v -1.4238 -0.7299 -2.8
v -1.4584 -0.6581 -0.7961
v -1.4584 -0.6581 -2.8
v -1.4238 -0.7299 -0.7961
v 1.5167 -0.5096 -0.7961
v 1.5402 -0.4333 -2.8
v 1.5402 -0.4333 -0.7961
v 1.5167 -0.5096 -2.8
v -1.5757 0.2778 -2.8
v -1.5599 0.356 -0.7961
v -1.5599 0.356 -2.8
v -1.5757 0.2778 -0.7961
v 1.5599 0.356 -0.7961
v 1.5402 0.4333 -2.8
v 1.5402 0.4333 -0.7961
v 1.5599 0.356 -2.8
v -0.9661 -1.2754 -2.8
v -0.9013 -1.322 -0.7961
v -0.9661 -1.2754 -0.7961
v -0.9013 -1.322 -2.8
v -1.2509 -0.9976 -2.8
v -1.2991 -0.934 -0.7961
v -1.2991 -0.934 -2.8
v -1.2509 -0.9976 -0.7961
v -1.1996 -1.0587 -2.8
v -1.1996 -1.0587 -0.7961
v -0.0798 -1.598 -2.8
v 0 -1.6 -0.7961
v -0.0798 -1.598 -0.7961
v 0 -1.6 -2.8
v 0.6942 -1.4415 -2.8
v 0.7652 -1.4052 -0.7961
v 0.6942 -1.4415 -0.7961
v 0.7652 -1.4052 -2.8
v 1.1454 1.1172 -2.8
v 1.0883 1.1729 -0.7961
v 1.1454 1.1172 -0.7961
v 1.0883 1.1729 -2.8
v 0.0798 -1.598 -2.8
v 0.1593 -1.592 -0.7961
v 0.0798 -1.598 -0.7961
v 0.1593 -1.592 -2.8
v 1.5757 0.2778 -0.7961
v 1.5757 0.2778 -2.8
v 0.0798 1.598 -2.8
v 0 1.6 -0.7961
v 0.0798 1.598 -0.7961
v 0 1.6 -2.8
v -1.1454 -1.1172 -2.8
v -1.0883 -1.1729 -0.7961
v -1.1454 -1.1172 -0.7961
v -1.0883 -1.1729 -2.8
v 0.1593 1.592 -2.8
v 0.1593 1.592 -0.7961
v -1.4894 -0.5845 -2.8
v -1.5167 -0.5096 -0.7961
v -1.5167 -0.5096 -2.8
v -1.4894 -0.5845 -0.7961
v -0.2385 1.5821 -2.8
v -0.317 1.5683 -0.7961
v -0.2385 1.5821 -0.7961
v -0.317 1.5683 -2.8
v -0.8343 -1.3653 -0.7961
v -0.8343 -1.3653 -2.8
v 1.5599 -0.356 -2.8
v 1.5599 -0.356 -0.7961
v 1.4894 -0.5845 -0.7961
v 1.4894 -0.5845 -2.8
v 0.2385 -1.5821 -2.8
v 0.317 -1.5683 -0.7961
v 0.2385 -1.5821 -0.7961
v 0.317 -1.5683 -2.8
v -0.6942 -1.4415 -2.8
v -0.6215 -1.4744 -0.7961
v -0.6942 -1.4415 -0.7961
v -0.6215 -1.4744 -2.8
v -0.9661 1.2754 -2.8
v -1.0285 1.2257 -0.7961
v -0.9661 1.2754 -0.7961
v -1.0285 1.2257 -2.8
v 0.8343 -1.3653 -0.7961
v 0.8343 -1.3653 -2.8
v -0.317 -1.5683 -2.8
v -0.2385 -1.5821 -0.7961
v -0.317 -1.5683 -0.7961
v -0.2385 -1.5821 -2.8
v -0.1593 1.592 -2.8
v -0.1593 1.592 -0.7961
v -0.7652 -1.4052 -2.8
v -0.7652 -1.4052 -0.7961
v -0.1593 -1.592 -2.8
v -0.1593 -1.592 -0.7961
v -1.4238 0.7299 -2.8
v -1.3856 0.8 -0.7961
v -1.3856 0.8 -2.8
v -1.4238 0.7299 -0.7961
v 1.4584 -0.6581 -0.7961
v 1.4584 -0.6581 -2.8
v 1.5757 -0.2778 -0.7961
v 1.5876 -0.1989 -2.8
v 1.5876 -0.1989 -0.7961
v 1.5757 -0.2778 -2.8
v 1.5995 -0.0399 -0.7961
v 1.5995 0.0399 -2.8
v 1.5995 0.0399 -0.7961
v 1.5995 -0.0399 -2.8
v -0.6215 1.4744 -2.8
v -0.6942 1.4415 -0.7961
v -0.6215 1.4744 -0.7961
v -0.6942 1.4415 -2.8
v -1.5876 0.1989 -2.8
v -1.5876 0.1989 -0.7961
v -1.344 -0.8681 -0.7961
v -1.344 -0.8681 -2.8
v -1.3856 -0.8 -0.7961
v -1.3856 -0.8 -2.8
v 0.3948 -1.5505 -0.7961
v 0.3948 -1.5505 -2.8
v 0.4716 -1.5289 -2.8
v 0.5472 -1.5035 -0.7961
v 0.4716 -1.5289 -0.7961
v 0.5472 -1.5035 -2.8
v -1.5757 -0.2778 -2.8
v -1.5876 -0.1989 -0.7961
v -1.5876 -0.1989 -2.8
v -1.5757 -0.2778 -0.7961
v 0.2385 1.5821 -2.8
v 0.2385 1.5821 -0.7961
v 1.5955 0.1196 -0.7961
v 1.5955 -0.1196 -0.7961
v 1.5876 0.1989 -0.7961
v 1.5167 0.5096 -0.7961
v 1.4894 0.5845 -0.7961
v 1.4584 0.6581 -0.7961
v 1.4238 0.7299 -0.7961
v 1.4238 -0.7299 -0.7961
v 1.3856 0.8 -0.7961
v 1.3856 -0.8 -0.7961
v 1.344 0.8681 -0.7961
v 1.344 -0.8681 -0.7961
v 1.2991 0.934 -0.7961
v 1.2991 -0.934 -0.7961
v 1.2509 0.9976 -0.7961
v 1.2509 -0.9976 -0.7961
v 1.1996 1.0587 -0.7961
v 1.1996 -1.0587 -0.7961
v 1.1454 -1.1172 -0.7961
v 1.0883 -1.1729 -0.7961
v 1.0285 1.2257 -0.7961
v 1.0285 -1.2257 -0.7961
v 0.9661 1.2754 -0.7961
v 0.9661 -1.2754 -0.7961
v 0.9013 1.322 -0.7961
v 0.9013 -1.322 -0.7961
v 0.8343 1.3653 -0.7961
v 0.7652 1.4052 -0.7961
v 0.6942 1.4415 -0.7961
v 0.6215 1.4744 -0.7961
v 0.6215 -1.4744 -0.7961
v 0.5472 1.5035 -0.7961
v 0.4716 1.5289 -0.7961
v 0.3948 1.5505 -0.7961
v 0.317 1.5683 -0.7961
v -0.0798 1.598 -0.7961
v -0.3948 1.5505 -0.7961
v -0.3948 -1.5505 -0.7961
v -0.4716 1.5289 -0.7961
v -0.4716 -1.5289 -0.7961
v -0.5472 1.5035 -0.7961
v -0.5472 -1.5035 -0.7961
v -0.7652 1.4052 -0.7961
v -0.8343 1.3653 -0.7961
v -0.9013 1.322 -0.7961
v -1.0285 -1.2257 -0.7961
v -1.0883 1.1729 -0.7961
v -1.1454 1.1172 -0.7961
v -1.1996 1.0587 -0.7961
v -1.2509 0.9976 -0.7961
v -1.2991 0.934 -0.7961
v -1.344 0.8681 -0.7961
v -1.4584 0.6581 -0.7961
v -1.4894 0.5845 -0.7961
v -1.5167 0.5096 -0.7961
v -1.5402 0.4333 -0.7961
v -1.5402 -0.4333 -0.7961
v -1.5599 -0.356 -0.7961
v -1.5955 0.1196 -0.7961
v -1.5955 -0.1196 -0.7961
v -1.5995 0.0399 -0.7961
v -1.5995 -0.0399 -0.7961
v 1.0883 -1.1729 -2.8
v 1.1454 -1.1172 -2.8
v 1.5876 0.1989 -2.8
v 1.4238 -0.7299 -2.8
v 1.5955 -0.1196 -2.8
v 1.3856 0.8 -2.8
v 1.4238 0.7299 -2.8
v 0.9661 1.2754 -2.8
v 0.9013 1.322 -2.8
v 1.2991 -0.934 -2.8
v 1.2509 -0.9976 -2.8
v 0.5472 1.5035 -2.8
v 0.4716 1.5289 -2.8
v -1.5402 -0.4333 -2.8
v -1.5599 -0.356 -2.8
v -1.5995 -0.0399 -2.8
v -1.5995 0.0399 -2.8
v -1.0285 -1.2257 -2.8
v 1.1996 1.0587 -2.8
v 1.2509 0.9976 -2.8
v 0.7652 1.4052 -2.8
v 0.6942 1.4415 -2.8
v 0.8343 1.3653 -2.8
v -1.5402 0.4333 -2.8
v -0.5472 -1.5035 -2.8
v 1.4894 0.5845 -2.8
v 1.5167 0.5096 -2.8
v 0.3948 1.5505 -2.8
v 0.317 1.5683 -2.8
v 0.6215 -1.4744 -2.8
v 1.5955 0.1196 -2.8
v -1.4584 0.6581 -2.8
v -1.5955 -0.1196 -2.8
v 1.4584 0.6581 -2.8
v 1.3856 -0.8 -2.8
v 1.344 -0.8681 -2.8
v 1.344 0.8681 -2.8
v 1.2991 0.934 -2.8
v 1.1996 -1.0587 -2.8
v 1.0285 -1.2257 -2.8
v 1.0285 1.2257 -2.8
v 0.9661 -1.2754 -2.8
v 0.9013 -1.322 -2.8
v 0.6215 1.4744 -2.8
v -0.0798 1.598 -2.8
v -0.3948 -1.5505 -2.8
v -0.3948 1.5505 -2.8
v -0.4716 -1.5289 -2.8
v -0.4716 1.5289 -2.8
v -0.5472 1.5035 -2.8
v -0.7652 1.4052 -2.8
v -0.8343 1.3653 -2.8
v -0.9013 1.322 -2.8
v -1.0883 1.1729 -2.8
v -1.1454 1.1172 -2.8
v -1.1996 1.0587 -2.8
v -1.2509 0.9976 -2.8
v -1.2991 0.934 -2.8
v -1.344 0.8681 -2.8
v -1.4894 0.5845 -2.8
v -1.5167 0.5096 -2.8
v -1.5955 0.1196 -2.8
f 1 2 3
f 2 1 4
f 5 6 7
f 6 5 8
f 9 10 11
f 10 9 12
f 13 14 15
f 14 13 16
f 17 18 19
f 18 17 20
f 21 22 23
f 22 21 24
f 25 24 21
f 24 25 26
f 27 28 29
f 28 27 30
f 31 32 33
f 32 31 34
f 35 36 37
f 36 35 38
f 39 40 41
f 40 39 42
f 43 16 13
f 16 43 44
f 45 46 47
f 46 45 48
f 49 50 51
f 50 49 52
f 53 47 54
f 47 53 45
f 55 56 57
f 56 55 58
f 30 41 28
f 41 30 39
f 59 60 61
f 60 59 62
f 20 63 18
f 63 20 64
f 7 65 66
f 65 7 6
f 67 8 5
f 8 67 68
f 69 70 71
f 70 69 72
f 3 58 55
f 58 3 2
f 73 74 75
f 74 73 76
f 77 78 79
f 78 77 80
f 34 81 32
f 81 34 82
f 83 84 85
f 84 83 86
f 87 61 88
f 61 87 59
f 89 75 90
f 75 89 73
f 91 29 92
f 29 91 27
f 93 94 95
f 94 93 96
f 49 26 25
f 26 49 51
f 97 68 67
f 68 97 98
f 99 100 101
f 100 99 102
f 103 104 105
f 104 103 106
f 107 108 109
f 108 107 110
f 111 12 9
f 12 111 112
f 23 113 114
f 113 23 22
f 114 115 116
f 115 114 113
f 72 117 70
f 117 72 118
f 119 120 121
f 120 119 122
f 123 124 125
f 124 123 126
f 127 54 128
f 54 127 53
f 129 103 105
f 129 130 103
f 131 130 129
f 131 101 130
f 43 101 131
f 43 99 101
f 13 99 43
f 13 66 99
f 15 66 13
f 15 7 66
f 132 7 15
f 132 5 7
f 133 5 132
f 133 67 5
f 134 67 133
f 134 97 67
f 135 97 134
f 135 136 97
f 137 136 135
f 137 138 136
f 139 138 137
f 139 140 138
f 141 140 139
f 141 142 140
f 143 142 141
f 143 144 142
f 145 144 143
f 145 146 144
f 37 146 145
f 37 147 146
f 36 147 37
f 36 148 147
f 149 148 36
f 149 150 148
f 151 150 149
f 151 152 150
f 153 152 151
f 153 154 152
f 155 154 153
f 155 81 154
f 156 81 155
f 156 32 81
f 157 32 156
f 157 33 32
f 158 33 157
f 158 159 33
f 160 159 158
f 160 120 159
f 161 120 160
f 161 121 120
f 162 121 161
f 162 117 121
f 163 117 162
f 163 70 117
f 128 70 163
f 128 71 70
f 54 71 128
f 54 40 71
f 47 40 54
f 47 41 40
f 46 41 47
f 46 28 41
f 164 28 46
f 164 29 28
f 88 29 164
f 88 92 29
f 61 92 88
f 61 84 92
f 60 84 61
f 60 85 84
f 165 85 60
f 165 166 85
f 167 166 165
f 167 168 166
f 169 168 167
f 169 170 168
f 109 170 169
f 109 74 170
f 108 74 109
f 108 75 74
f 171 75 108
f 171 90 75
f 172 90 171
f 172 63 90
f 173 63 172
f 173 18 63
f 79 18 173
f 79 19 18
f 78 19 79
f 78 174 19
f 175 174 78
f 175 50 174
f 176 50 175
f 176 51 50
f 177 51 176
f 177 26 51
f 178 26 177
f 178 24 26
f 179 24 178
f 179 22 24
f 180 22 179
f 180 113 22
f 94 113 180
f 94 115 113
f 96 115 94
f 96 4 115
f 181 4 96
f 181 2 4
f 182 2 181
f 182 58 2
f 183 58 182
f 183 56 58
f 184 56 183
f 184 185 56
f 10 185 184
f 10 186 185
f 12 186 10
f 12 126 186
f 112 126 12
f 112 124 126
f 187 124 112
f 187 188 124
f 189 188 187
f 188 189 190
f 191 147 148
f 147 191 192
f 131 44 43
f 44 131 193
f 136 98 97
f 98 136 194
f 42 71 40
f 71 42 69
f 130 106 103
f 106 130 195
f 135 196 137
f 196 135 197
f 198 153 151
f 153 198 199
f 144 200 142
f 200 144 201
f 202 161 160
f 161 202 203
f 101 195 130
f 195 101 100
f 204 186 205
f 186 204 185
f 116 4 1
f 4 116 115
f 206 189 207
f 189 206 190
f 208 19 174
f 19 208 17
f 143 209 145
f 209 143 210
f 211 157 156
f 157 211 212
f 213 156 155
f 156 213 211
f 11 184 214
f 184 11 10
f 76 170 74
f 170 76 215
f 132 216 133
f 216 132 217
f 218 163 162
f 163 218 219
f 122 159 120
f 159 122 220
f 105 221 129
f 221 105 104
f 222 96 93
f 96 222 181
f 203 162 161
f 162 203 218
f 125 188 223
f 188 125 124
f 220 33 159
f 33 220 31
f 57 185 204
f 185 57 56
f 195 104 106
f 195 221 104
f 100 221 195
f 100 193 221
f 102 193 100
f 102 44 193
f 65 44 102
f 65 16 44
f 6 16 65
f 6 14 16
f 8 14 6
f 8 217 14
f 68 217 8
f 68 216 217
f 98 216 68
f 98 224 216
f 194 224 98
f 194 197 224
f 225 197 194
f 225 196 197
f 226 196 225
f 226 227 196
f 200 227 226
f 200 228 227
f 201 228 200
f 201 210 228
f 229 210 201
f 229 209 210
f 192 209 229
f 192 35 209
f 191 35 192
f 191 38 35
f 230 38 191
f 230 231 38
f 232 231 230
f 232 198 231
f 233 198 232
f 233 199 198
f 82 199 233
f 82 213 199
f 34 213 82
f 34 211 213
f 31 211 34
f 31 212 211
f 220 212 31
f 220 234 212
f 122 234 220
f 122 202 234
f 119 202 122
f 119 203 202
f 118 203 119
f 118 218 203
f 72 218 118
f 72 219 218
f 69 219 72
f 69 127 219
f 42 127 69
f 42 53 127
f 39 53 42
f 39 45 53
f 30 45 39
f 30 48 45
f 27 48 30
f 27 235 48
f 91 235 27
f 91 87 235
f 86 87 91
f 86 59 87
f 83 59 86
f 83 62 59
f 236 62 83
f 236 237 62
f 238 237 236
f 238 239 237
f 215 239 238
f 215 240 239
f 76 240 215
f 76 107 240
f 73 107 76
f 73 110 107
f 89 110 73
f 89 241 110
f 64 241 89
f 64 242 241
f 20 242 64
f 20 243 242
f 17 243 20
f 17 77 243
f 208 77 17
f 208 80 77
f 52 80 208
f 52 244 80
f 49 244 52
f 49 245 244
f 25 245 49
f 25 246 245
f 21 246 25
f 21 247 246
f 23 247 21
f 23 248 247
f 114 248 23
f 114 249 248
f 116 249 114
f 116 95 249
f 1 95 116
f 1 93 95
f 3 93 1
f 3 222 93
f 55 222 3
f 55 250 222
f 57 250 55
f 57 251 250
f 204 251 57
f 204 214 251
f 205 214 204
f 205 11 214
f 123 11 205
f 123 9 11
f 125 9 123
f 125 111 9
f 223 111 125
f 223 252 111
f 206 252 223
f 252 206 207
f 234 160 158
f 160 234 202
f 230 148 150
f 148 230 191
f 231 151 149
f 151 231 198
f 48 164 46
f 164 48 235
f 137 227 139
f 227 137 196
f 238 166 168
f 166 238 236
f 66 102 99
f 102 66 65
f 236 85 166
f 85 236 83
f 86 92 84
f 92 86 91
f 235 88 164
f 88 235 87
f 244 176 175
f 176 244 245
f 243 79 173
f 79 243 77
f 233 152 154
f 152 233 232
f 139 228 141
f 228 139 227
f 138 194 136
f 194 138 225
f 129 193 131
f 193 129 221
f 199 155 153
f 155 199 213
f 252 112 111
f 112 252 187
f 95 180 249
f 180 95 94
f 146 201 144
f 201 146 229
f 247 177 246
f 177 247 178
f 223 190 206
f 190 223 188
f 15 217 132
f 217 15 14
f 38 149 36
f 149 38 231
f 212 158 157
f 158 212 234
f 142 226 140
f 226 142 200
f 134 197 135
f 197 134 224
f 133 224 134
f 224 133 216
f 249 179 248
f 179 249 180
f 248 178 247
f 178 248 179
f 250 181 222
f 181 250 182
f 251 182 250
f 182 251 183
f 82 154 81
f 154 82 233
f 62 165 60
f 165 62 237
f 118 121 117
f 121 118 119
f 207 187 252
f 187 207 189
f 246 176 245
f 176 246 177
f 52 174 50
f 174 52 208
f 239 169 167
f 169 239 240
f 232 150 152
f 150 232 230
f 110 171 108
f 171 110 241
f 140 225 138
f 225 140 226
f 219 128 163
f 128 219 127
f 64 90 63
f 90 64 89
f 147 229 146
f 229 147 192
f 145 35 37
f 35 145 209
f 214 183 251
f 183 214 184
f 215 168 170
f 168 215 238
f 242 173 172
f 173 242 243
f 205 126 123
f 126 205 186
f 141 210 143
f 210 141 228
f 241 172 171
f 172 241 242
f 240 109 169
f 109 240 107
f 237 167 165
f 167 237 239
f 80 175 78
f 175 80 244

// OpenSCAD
use <../lib.scad>
use <s/3351as01.scad>
$fa=1; $fs=0.2;
function ldraw_lib__3351ap05(realsolid=false) = [
// 0 Roadsign Triangular Type 1 with Skidding Car Pattern
// 0 Name: 3351ap05.dat
// 0 Author: J.C. Tchang [tchang]
// 0 !LDRAW_ORG Part UPDATE 2010-02
// 0 !LICENSE Licensed under CC BY 2.0 and CC BY 4.0 : see CAreadme.txt
// 
// 0 BFC CERTIFY CCW
  [0,"BFC","CERTIFY"],
  [0,"BFC","CCW"],
// 
// 0 !HISTORY 2010-07-05 [PTadmin] Official Update 2010-02
// 
// 
// 1 16 0 0 0 1 0 0 0 1 0 0 0 1 s\3351as01.dat
  [1,16,0,0,0,1,0,0,0,1,0,0,0,1, ldraw_lib__s__3351as01(realsolid)],
// 0 //
// 4 4 -22 -70 -2 -22 -68 -2 22 -68 -2 22 -70 -2
  [4,4,-22,-70,-2,-22,-68,-2,22,-68,-2,22,-70,-2],
// 4 4 22 -70 -2 16.8 -73 -2 -16.8 -73 -2 -22 -70 -2
  [4,4,22,-70,-2,16.8,-73,-2,-16.8,-73,-2,-22,-70,-2],
// 4 4 22 -70 -2 22 -68 -2 23 -68.27 -2 23.73 -69 -2
  [4,4,22,-70,-2,22,-68,-2,23,-68.27,-2,23.73,-69,-2],
// 4 4 22 -70 -2 23.73 -69 -2 24 -70 -2 23.73 -71 -2
  [4,4,22,-70,-2,23.73,-69,-2,24,-70,-2,23.73,-71,-2],
// 4 4 22 -70 -2 23.73 -71 -2 1.73 -109.1 -2 0 -108.1 -2
  [4,4,22,-70,-2,23.73,-71,-2,1.73,-109.1,-2,0,-108.1,-2],
// 4 4 0 -108.1 -2 0 -102.1 -2 16.8 -73 -2 22 -70 -2
  [4,4,0,-108.1,-2,0,-102.1,-2,16.8,-73,-2,22,-70,-2],
// 4 4 -23 -68.27 -2 -22 -68 -2 -22 -70 -2 -23.73 -69 -2
  [4,4,-23,-68.27,-2,-22,-68,-2,-22,-70,-2,-23.73,-69,-2],
// 4 4 -24 -70 -2 -23.73 -69 -2 -22 -70 -2 -23.73 -71 -2
  [4,4,-24,-70,-2,-23.73,-69,-2,-22,-70,-2,-23.73,-71,-2],
// 4 4 0 -108.1 -2 -1.73 -109.1 -2 -23.73 -71 -2 -22 -70 -2
  [4,4,0,-108.1,-2,-1.73,-109.1,-2,-23.73,-71,-2,-22,-70,-2],
// 4 4 -22 -70 -2 -16.8 -73 -2 0 -102.1 -2 0 -108.1 -2
  [4,4,-22,-70,-2,-16.8,-73,-2,0,-102.1,-2,0,-108.1,-2],
// 4 4 -1 -109.83 -2 -1.73 -109.1 -2 0 -108.1 -2 0 -110.1 -2
  [4,4,-1,-109.83,-2,-1.73,-109.1,-2,0,-108.1,-2,0,-110.1,-2],
// 4 4 1 -109.83 -2 0 -110.1 -2 0 -108.1 -2 1.73 -109.1 -2
  [4,4,1,-109.83,-2,0,-110.1,-2,0,-108.1,-2,1.73,-109.1,-2],
// 0 //
// 4 0 -2.1 -82.3 -2 -1.5 -81.8 -2 -0.6 -81.6 -2 0.1 -81.9 -2
  [4,0,-2.1,-82.3,-2,-1.5,-81.8,-2,-0.6,-81.6,-2,0.1,-81.9,-2],
// 4 0 0.1 -81.9 -2 0.4 -82.2 -2 -2.2 -82.8 -2 -2.1 -82.3 -2
  [4,0,0.1,-81.9,-2,0.4,-82.2,-2,-2.2,-82.8,-2,-2.1,-82.3,-2],
// 4 0 1 -82.4 -2 -2.7 -83.2 -2 -2.2 -82.8 -2 0.4 -82.2 -2
  [4,0,1,-82.4,-2,-2.7,-83.2,-2,-2.2,-82.8,-2,0.4,-82.2,-2],
// 4 0 3.2 -79.2 -2 4.1 -79 -2 4.7 -79.8 -2 2.8 -80.2 -2
  [4,0,3.2,-79.2,-2,4.1,-79,-2,4.7,-79.8,-2,2.8,-80.2,-2],
// 4 0 5 -80.9 -2 3.1 -81.3 -2 2.8 -80.2 -2 4.7 -79.8 -2
  [4,0,5,-80.9,-2,3.1,-81.3,-2,2.8,-80.2,-2,4.7,-79.8,-2],
// 4 0 5 -80.9 -2 5.4 -81.4 -2 3 -81.9 -2 3.1 -81.3 -2
  [4,0,5,-80.9,-2,5.4,-81.4,-2,3,-81.9,-2,3.1,-81.3,-2],
// 4 0 5.4 -81.4 -2 6 -81.6 -2 6.8 -85.3 -2 6.5 -86 -2
  [4,0,5.4,-81.4,-2,6,-81.6,-2,6.8,-85.3,-2,6.5,-86,-2],
// 4 0 6.5 -86 -2 6.1 -86.3 -2 3 -81.9 -2 5.4 -81.4 -2
  [4,0,6.5,-86,-2,6.1,-86.3,-2,3,-81.9,-2,5.4,-81.4,-2],
// 4 0 6.2 -86.9 -2 5.1 -87 -2 4.9 -86.7 -2 6.1 -86.3 -2
  [4,0,6.2,-86.9,-2,5.1,-87,-2,4.9,-86.7,-2,6.1,-86.3,-2],
// 4 0 5.9 -90.1 -2 4.9 -89.4 -2 5.1 -87 -2 6.2 -86.9 -2
  [4,0,5.9,-90.1,-2,4.9,-89.4,-2,5.1,-87,-2,6.2,-86.9,-2],
// 4 0 5.9 -90.1 -2 5.6 -90.6 -2 4.7 -89.7 -2 4.9 -89.4 -2
  [4,0,5.9,-90.1,-2,5.6,-90.6,-2,4.7,-89.7,-2,4.9,-89.4,-2],
// 3 0 5.6 -90.6 -2 5.2 -90.9 -2 4.7 -89.7 -2
  [3,0,5.6,-90.6,-2,5.2,-90.9,-2,4.7,-89.7,-2],
// 4 0 1.4 -91.8 -2 1.2 -90.7 -2 4.7 -89.7 -2 5.2 -90.9 -2
  [4,0,1.4,-91.8,-2,1.2,-90.7,-2,4.7,-89.7,-2,5.2,-90.9,-2],
// 4 0 1.4 -91.8 -2 -2.5 -92.4 -2 -2.4 -91.3 -2 1.2 -90.7 -2
  [4,0,1.4,-91.8,-2,-2.5,-92.4,-2,-2.4,-91.3,-2,1.2,-90.7,-2],
// 4 0 -3.3 -92.3 -2 -2.9 -91.3 -2 -2.4 -91.3 -2 -2.5 -92.4 -2
  [4,0,-3.3,-92.3,-2,-2.9,-91.3,-2,-2.4,-91.3,-2,-2.5,-92.4,-2],
// 4 0 -3.3 -92.3 -2 -4 -91.8 -2 -3.1 -91.1 -2 -2.9 -91.3 -2
  [4,0,-3.3,-92.3,-2,-4,-91.8,-2,-3.1,-91.1,-2,-2.9,-91.3,-2],
// 4 0 -5.5 -88.9 -2 -4.2 -89.1 -2 -3.1 -91.1 -2 -4 -91.8 -2
  [4,0,-5.5,-88.9,-2,-4.2,-89.1,-2,-3.1,-91.1,-2,-4,-91.8,-2],
// 4 0 -5.8 -88.5 -2 -4 -88.5 -2 -4.2 -89.1 -2 -5.5 -88.9 -2
  [4,0,-5.8,-88.5,-2,-4,-88.5,-2,-4.2,-89.1,-2,-5.5,-88.9,-2],
// 4 0 -6.5 -88.4 -2 -6.9 -87.8 -2 -7.3 -84.5 -2 -6.9 -84 -2
  [4,0,-6.5,-88.4,-2,-6.9,-87.8,-2,-7.3,-84.5,-2,-6.9,-84,-2],
// 4 0 -6.9 -84 -2 -6.7 -83.9 -2 -5.8 -88.5 -2 -6.5 -88.4 -2
  [4,0,-6.9,-84,-2,-6.7,-83.9,-2,-5.8,-88.5,-2,-6.5,-88.4,-2],
// 4 0 -6.7 -83.9 -2 -6.6 -83.5 -2 -4.9 -83.1 -2 -4.1 -83.4 -2
  [4,0,-6.7,-83.9,-2,-6.6,-83.5,-2,-4.9,-83.1,-2,-4.1,-83.4,-2],
// 4 0 -4.1 -83.4 -2 -4 -88.5 -2 -5.8 -88.5 -2 -6.7 -83.9 -2
  [4,0,-4.1,-83.4,-2,-4,-88.5,-2,-5.8,-88.5,-2,-6.7,-83.9,-2],
// 4 0 -4.1 -83.4 -2 -2.7 -83.2 -2 0.6 -87.7 -2 -4 -88.5 -2
  [4,0,-4.1,-83.4,-2,-2.7,-83.2,-2,0.6,-87.7,-2,-4,-88.5,-2],
// 4 0 -2.7 -83.2 -2 1 -82.4 -2 4.9 -86.7 -2 0.6 -87.7 -2
  [4,0,-2.7,-83.2,-2,1,-82.4,-2,4.9,-86.7,-2,0.6,-87.7,-2],
// 4 0 3 -81.9 -2 6.1 -86.3 -2 4.9 -86.7 -2 1 -82.4 -2
  [4,0,3,-81.9,-2,6.1,-86.3,-2,4.9,-86.7,-2,1,-82.4,-2],
// 4 0 -6.6 -83.5 -2 -6.9 -81.9 -2 -5.1 -81.5 -2 -4.9 -83.1 -2
  [4,0,-6.6,-83.5,-2,-6.9,-81.9,-2,-5.1,-81.5,-2,-4.9,-83.1,-2],
// 4 0 -6.9 -81.9 -2 -6.8 -81 -2 -5.6 -80.8 -2 -5.1 -81.5 -2
  [4,0,-6.9,-81.9,-2,-6.8,-81,-2,-5.6,-80.8,-2,-5.1,-81.5,-2],
// 4 0 -7.2 -78.2 -2 -6 -79.6 -2 -6.3 -80.1 -2 -8.6 -78.2 -2
  [4,0,-7.2,-78.2,-2,-6,-79.6,-2,-6.3,-80.1,-2,-8.6,-78.2,-2],
// 4 0 -8.6 -78.2 -2 -8.6 -77.4 -2 -7.2 -77.8 -2 -7.2 -78.2 -2
  [4,0,-8.6,-78.2,-2,-8.6,-77.4,-2,-7.2,-77.8,-2,-7.2,-78.2,-2],
// 4 0 -5.7 -75.9 -2 -5.3 -76.4 -2 -7.2 -77.8 -2 -8.6 -77.4 -2
  [4,0,-5.7,-75.9,-2,-5.3,-76.4,-2,-7.2,-77.8,-2,-8.6,-77.4,-2],
// 4 0 -2.9 -77.8 -2 -1.3 -79.5 -2 -1.9 -79.9 -2 -4.3 -78.1 -2
  [4,0,-2.9,-77.8,-2,-1.3,-79.5,-2,-1.9,-79.9,-2,-4.3,-78.1,-2],
// 4 0 -4.3 -78.1 -2 -4.2 -77.2 -2 -2.9 -77.3 -2 -2.9 -77.8 -2
  [4,0,-4.3,-78.1,-2,-4.2,-77.2,-2,-2.9,-77.3,-2,-2.9,-77.8,-2],
// 4 0 -2.8 -75.2 -2 -1.4 -75.6 -2 -2.9 -77.3 -2 -4.2 -77.2 -2
  [4,0,-2.8,-75.2,-2,-1.4,-75.6,-2,-2.9,-77.3,-2,-4.2,-77.2,-2],
// 4 0 -2.8 -75.2 -2 -2.8 -74.8 -2 -1.2 -74.8 -2 -1.4 -75.6 -2
  [4,0,-2.8,-75.2,-2,-2.8,-74.8,-2,-1.2,-74.8,-2,-1.4,-75.6,-2],
// 4 0 -3 -74.6 -2 -1.9 -74.1 -2 -1.2 -74.8 -2 -2.8 -74.8 -2
  [4,0,-3,-74.6,-2,-1.9,-74.1,-2,-1.2,-74.8,-2,-2.8,-74.8,-2],
// 4 0 -3 -74.6 -2 -4.9 -74.3 -2 -4.9 -73.8 -2 -3.3 -73.7 -2
  [4,0,-3,-74.6,-2,-4.9,-74.3,-2,-4.9,-73.8,-2,-3.3,-73.7,-2],
// 3 0 -3.3 -73.7 -2 -1.9 -74.1 -2 -3 -74.6 -2
  [3,0,-3.3,-73.7,-2,-1.9,-74.1,-2,-3,-74.6,-2],
// 4 0 0.4 -78.1 -2 -0.1 -77.8 -2 0.2 -77.1 -2 0.9 -77.5 -2
  [4,0,0.4,-78.1,-2,-0.1,-77.8,-2,0.2,-77.1,-2,0.9,-77.5,-2],
// 4 0 1.9 -76.1 -2 2.2 -76.9 -2 0.9 -77.5 -2 0.2 -77.1 -2
  [4,0,1.9,-76.1,-2,2.2,-76.9,-2,0.9,-77.5,-2,0.2,-77.1,-2],
// 4 0 1.9 -76.1 -2 3.9 -75.4 -2 3.8 -76.5 -2 2.2 -76.9 -2
  [4,0,1.9,-76.1,-2,3.9,-75.4,-2,3.8,-76.5,-2,2.2,-76.9,-2],
// 4 0 3.9 -75.4 -2 4.2 -75 -2 5.1 -75.9 -2 3.8 -76.5 -2
  [4,0,3.9,-75.4,-2,4.2,-75,-2,5.1,-75.9,-2,3.8,-76.5,-2],
// 4 0 5.8 -75.1 -2 5.1 -75.9 -2 4.2 -75 -2 5.7 -74.3 -2
  [4,0,5.8,-75.1,-2,5.1,-75.9,-2,4.2,-75,-2,5.7,-74.3,-2],
// 4 0 4.2 -75 -2 4 -74.5 -2 5 -73.7 -2 5.7 -74.3 -2
  [4,0,4.2,-75,-2,4,-74.5,-2,5,-73.7,-2,5.7,-74.3,-2],
// 3 0 4 -74.5 -2 4.1 -73.5 -2 5 -73.7 -2
  [3,0,4,-74.5,-2,4.1,-73.5,-2,5,-73.7,-2],
// 4 0 4 -74.5 -2 3.1 -74.2 -2 3.1 -73.6 -2 4.1 -73.5 -2
  [4,0,4,-74.5,-2,3.1,-74.2,-2,3.1,-73.6,-2,4.1,-73.5,-2],
// 0 //
// 4 16 -2.9 -91.3 -2 -3.1 -91.1 -2 -4.2 -89.1 -2 -4 -88.5 -2
  [4,16,-2.9,-91.3,-2,-3.1,-91.1,-2,-4.2,-89.1,-2,-4,-88.5,-2],
// 4 16 -4 -88.5 -2 0.6 -87.7 -2 -2.4 -91.3 -2 -2.9 -91.3 -2
  [4,16,-4,-88.5,-2,0.6,-87.7,-2,-2.4,-91.3,-2,-2.9,-91.3,-2],
// 4 16 4.9 -86.7 -2 5.1 -87 -2 4.9 -89.4 -2 4.7 -89.7 -2
  [4,16,4.9,-86.7,-2,5.1,-87,-2,4.9,-89.4,-2,4.7,-89.7,-2],
// 4 16 0.6 -87.7 -2 4.9 -86.7 -2 4.7 -89.7 -2 1.2 -90.7 -2
  [4,16,0.6,-87.7,-2,4.9,-86.7,-2,4.7,-89.7,-2,1.2,-90.7,-2],
// 3 16 1.2 -90.7 -2 -2.4 -91.3 -2 0.6 -87.7 -2
  [3,16,1.2,-90.7,-2,-2.4,-91.3,-2,0.6,-87.7,-2],
// 4 16 -2.7 -83.2 -2 -4.1 -83.4 -2 -4.9 -83.1 -2 -2.2 -82.8 -2
  [4,16,-2.7,-83.2,-2,-4.1,-83.4,-2,-4.9,-83.1,-2,-2.2,-82.8,-2],
// 4 16 -5.1 -81.5 -2 -2.1 -82.3 -2 -2.2 -82.8 -2 -4.9 -83.1 -2
  [4,16,-5.1,-81.5,-2,-2.1,-82.3,-2,-2.2,-82.8,-2,-4.9,-83.1,-2],
// 4 16 -5.1 -81.5 -2 -5.6 -80.8 -2 -1.5 -81.8 -2 -2.1 -82.3 -2
  [4,16,-5.1,-81.5,-2,-5.6,-80.8,-2,-1.5,-81.8,-2,-2.1,-82.3,-2],
// 4 16 3 -81.9 -2 1 -82.4 -2 0.4 -82.2 -2 3.1 -81.3 -2
  [4,16,3,-81.9,-2,1,-82.4,-2,0.4,-82.2,-2,3.1,-81.3,-2],
// 4 16 0.1 -81.9 -2 2.8 -80.2 -2 3.1 -81.3 -2 0.4 -82.2 -2
  [4,16,0.1,-81.9,-2,2.8,-80.2,-2,3.1,-81.3,-2,0.4,-82.2,-2],
// 4 16 0.1 -81.9 -2 -0.6 -81.6 -2 3.2 -79.2 -2 2.8 -80.2 -2
  [4,16,0.1,-81.9,-2,-0.6,-81.6,-2,3.2,-79.2,-2,2.8,-80.2,-2],
// 4 16 -1.5 -81.8 -2 -1.9 -79.9 -2 -1.3 -79.5 -2 -0.6 -81.6 -2
  [4,16,-1.5,-81.8,-2,-1.9,-79.9,-2,-1.3,-79.5,-2,-0.6,-81.6,-2],
// 4 16 -5.6 -80.8 -2 -6.3 -80.1 -2 -6 -79.6 -2 -1.5 -81.8 -2
  [4,16,-5.6,-80.8,-2,-6.3,-80.1,-2,-6,-79.6,-2,-1.5,-81.8,-2],
// 4 16 -1.5 -81.8 -2 -6 -79.6 -2 -4.3 -78.1 -2 -1.9 -79.9 -2
  [4,16,-1.5,-81.8,-2,-6,-79.6,-2,-4.3,-78.1,-2,-1.9,-79.9,-2],
// 4 16 -4.3 -78.1 -2 -6 -79.6 -2 -7.2 -78.2 -2 -7.2 -77.8 -2
  [4,16,-4.3,-78.1,-2,-6,-79.6,-2,-7.2,-78.2,-2,-7.2,-77.8,-2],
// 4 16 -7.2 -77.8 -2 -5.3 -76.4 -2 -4.2 -77.2 -2 -4.3 -78.1 -2
  [4,16,-7.2,-77.8,-2,-5.3,-76.4,-2,-4.2,-77.2,-2,-4.3,-78.1,-2],
// 4 16 -4.2 -77.2 -2 -5.3 -76.4 -2 -2.8 -74.8 -2 -2.8 -75.2 -2
  [4,16,-4.2,-77.2,-2,-5.3,-76.4,-2,-2.8,-74.8,-2,-2.8,-75.2,-2],
// 4 16 -5.3 -76.4 -2 -5.7 -75.9 -2 -3 -74.6 -2 -2.8 -74.8 -2
  [4,16,-5.3,-76.4,-2,-5.7,-75.9,-2,-3,-74.6,-2,-2.8,-74.8,-2],
// 4 16 0.4 -78.1 -2 3.2 -79.2 -2 -0.6 -81.6 -2 -1.3 -79.5 -2
  [4,16,0.4,-78.1,-2,3.2,-79.2,-2,-0.6,-81.6,-2,-1.3,-79.5,-2],
// 4 16 -0.1 -77.8 -2 0.4 -78.1 -2 -1.3 -79.5 -2 -2.9 -77.8 -2
  [4,16,-0.1,-77.8,-2,0.4,-78.1,-2,-1.3,-79.5,-2,-2.9,-77.8,-2],
// 4 16 -2.9 -77.8 -2 -2.9 -77.3 -2 0.2 -77.1 -2 -0.1 -77.8 -2
  [4,16,-2.9,-77.8,-2,-2.9,-77.3,-2,0.2,-77.1,-2,-0.1,-77.8,-2],
// 4 16 0.2 -77.1 -2 -2.9 -77.3 -2 -1.4 -75.6 -2 1.9 -76.1 -2
  [4,16,0.2,-77.1,-2,-2.9,-77.3,-2,-1.4,-75.6,-2,1.9,-76.1,-2],
// 4 16 -1.2 -74.8 -2 3.9 -75.4 -2 1.9 -76.1 -2 -1.4 -75.6 -2
  [4,16,-1.2,-74.8,-2,3.9,-75.4,-2,1.9,-76.1,-2,-1.4,-75.6,-2],
// 4 16 4.2 -75 -2 3.9 -75.4 -2 -1.2 -74.8 -2 4 -74.5 -2
  [4,16,4.2,-75,-2,3.9,-75.4,-2,-1.2,-74.8,-2,4,-74.5,-2],
// 3 16 3.1 -74.2 -2 4 -74.5 -2 -1.2 -74.8 -2
  [3,16,3.1,-74.2,-2,4,-74.5,-2,-1.2,-74.8,-2],
// 4 16 3.1 -73.6 -2 3.1 -74.2 -2 -1.2 -74.8 -2 -1.9 -74.1 -2
  [4,16,3.1,-73.6,-2,3.1,-74.2,-2,-1.2,-74.8,-2,-1.9,-74.1,-2],
// 4 16 0.4 -78.1 -2 0.9 -77.5 -2 4.1 -79 -2 3.2 -79.2 -2
  [4,16,0.4,-78.1,-2,0.9,-77.5,-2,4.1,-79,-2,3.2,-79.2,-2],
// 4 16 4.1 -79 -2 0.9 -77.5 -2 2.2 -76.9 -2 3.8 -76.5 -2
  [4,16,4.1,-79,-2,0.9,-77.5,-2,2.2,-76.9,-2,3.8,-76.5,-2],
// 4 16 4.1 -79 -2 3.8 -76.5 -2 5.1 -75.9 -2 4.7 -79.8 -2
  [4,16,4.1,-79,-2,3.8,-76.5,-2,5.1,-75.9,-2,4.7,-79.8,-2],
// 4 16 5.4 -81.4 -2 5 -80.9 -2 4.7 -79.8 -2 6 -81.6 -2
  [4,16,5.4,-81.4,-2,5,-80.9,-2,4.7,-79.8,-2,6,-81.6,-2],
// 4 16 6 -81.6 -2 4.7 -79.8 -2 5.1 -75.9 -2 5.8 -75.1 -2
  [4,16,6,-81.6,-2,4.7,-79.8,-2,5.1,-75.9,-2,5.8,-75.1,-2],
// 4 16 6.8 -85.3 -2 6 -81.6 -2 5.8 -75.1 -2 16.8 -73 -2
  [4,16,6.8,-85.3,-2,6,-81.6,-2,5.8,-75.1,-2,16.8,-73,-2],
// 3 16 5.8 -75.1 -2 5.7 -74.3 -2 16.8 -73 -2
  [3,16,5.8,-75.1,-2,5.7,-74.3,-2,16.8,-73,-2],
// 3 16 5 -73.7 -2 16.8 -73 -2 5.7 -74.3 -2
  [3,16,5,-73.7,-2,16.8,-73,-2,5.7,-74.3,-2],
// 4 16 5 -73.7 -2 4.1 -73.5 -2 4.1 -73 -2 16.8 -73 -2
  [4,16,5,-73.7,-2,4.1,-73.5,-2,4.1,-73,-2,16.8,-73,-2],
// 3 16 3.1 -73.6 -2 4.1 -73 -2 4.1 -73.5 -2
  [3,16,3.1,-73.6,-2,4.1,-73,-2,4.1,-73.5,-2],
// 4 16 4.1 -73 -2 3.1 -73.6 -2 -1.9 -74.1 -2 -3.3 -73.7 -2
  [4,16,4.1,-73,-2,3.1,-73.6,-2,-1.9,-74.1,-2,-3.3,-73.7,-2],
// 4 16 -16.8 -73 -2 4.1 -73 -2 -3.3 -73.7 -2 -4.9 -73.8 -2
  [4,16,-16.8,-73,-2,4.1,-73,-2,-3.3,-73.7,-2,-4.9,-73.8,-2],
// 3 16 -4.9 -74.3 -2 -16.8 -73 -2 -4.9 -73.8 -2
  [3,16,-4.9,-74.3,-2,-16.8,-73,-2,-4.9,-73.8,-2],
// 3 16 -5.7 -75.9 -2 -4.9 -74.3 -2 -3 -74.6 -2
  [3,16,-5.7,-75.9,-2,-4.9,-74.3,-2,-3,-74.6,-2],
// 4 16 -4.9 -74.3 -2 -5.7 -75.9 -2 -8.6 -77.4 -2 -16.8 -73 -2
  [4,16,-4.9,-74.3,-2,-5.7,-75.9,-2,-8.6,-77.4,-2,-16.8,-73,-2],
// 4 16 -6.3 -80.1 -2 -5.6 -80.8 -2 -6.8 -81 -2 -8.6 -78.2 -2
  [4,16,-6.3,-80.1,-2,-5.6,-80.8,-2,-6.8,-81,-2,-8.6,-78.2,-2],
// 3 16 -6.8 -81 -2 -6.9 -81.9 -2 -8.6 -78.2 -2
  [3,16,-6.8,-81,-2,-6.9,-81.9,-2,-8.6,-78.2,-2],
// 4 16 -6.6 -83.5 -2 -6.7 -83.9 -2 -6.9 -84 -2 -6.9 -81.9 -2
  [4,16,-6.6,-83.5,-2,-6.7,-83.9,-2,-6.9,-84,-2,-6.9,-81.9,-2],
// 4 16 -6.9 -81.9 -2 -6.9 -84 -2 -7.3 -84.5 -2 -8.6 -78.2 -2
  [4,16,-6.9,-81.9,-2,-6.9,-84,-2,-7.3,-84.5,-2,-8.6,-78.2,-2],
// 3 16 -8.6 -78.2 -2 -16.8 -73 -2 -8.6 -77.4 -2
  [3,16,-8.6,-78.2,-2,-16.8,-73,-2,-8.6,-77.4,-2],
// 4 16 -16.8 -73 -2 -8.6 -78.2 -2 -7.3 -84.5 -2 -6.9 -87.8 -2
  [4,16,-16.8,-73,-2,-8.6,-78.2,-2,-7.3,-84.5,-2,-6.9,-87.8,-2],
// 4 16 -6.5 -88.4 -2 -5.8 -88.5 -2 -5.5 -88.9 -2 -4 -91.8 -2
  [4,16,-6.5,-88.4,-2,-5.8,-88.5,-2,-5.5,-88.9,-2,-4,-91.8,-2],
// 3 16 -6.9 -87.8 -2 -7.4356 -89.2205 -2 -16.8 -73 -2
  [3,16,-6.9,-87.8,-2,-7.4356,-89.2205,-2,-16.8,-73,-2],
// 3 16 -6.5 -88.4 -2 -7.4356 -89.2205 -2 -6.9 -87.8 -2
  [3,16,-6.5,-88.4,-2,-7.4356,-89.2205,-2,-6.9,-87.8,-2],
// 4 16 -7.4356 -89.2205 -2 -6.5 -88.4 -2 -4 -91.8 -2 0 -102.1 -2
  [4,16,-7.4356,-89.2205,-2,-6.5,-88.4,-2,-4,-91.8,-2,0,-102.1,-2],
// 3 16 -4 -91.8 -2 -3.3 -92.3 -2 0 -102.1 -2
  [3,16,-4,-91.8,-2,-3.3,-92.3,-2,0,-102.1,-2],
// 3 16 -2.5 -92.4 -2 0 -102.1 -2 -3.3 -92.3 -2
  [3,16,-2.5,-92.4,-2,0,-102.1,-2,-3.3,-92.3,-2],
// 3 16 -2.5 -92.4 -2 1.4 -91.8 -2 0 -102.1 -2
  [3,16,-2.5,-92.4,-2,1.4,-91.8,-2,0,-102.1,-2],
// 3 16 5.2 -90.9 -2 0 -102.1 -2 1.4 -91.8 -2
  [3,16,5.2,-90.9,-2,0,-102.1,-2,1.4,-91.8,-2],
// 4 16 0 -102.1 -2 5.2 -90.9 -2 5.6 -90.6 -2 6.7294 -90.4438 -2
  [4,16,0,-102.1,-2,5.2,-90.9,-2,5.6,-90.6,-2,6.7294,-90.4438,-2],
// 3 16 5.6 -90.6 -2 5.9 -90.1 -2 6.7294 -90.4438 -2
  [3,16,5.6,-90.6,-2,5.9,-90.1,-2,6.7294,-90.4438,-2],
// 4 16 6.7294 -90.4438 -2 5.9 -90.1 -2 6.2 -86.9 -2 6.5 -86 -2
  [4,16,6.7294,-90.4438,-2,5.9,-90.1,-2,6.2,-86.9,-2,6.5,-86,-2],
// 3 16 6.5 -86 -2 6.2 -86.9 -2 6.1 -86.3 -2
  [3,16,6.5,-86,-2,6.2,-86.9,-2,6.1,-86.3,-2],
// 4 16 6.5 -86 -2 6.8 -85.3 -2 16.8 -73 -2 6.7294 -90.4438 -2
  [4,16,6.5,-86,-2,6.8,-85.3,-2,16.8,-73,-2,6.7294,-90.4438,-2],
// 0 //
];
module ldraw_lib__3351ap05(step=0, col=false, unit=2/5, alt=false, line=0.2, solid=!$preview)
    makepoly(ldraw_lib__3351ap05(solid), step=step, col=col, unit=unit, alt=alt, line=line, solid=solid);
ldraw_lib__3351ap05(line=0.2);
